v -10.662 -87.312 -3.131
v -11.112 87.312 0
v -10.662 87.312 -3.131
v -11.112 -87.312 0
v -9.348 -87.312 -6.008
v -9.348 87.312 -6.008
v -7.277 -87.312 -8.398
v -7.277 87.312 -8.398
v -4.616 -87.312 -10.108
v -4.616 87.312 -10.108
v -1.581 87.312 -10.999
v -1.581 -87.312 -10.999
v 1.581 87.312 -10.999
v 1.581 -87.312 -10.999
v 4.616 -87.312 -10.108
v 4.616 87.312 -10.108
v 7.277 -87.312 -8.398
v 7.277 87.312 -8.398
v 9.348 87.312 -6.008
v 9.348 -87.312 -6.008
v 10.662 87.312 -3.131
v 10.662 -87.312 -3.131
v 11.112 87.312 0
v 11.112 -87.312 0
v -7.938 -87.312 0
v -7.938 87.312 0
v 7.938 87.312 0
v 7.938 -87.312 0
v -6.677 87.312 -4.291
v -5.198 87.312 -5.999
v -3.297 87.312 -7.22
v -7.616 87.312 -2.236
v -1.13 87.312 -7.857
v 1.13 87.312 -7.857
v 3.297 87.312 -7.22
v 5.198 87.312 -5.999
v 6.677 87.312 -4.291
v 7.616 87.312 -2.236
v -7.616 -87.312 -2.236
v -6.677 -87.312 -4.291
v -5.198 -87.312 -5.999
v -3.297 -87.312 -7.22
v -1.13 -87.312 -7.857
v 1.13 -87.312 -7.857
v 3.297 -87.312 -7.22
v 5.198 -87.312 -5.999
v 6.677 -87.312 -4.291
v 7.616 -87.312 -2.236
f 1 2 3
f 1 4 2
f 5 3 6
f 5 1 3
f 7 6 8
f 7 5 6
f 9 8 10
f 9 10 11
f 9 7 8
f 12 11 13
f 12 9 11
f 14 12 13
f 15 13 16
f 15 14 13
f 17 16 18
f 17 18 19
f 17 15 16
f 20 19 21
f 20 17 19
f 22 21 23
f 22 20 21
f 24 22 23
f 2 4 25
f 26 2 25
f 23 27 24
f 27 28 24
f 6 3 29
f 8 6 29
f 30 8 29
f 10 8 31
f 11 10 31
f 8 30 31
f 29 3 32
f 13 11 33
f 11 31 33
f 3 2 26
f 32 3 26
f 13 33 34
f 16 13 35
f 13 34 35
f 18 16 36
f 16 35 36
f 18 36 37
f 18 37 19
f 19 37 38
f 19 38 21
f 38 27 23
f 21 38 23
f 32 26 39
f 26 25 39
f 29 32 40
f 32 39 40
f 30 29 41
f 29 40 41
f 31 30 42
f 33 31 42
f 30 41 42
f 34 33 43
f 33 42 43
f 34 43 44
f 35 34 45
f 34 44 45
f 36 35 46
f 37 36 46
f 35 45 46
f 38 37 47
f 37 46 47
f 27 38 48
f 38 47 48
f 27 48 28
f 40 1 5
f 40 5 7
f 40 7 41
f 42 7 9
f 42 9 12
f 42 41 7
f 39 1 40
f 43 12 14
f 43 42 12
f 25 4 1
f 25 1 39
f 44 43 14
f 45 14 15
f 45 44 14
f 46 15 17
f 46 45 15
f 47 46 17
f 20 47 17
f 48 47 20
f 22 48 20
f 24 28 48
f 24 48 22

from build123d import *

# Parameters (mm, degrees)
F0_R     = 11.1125
F1_DEPTH = 87.3125
F2_R     = 7.9375
F3_DEPTH = 127
F4_W     = 41.7499989271
F4_H     = 12.747396715
F5_DEPTH = 127


with BuildPart() as f1:
    # F0 (on Front) → F1 (new body, symmetric)
    with BuildSketch(Plane.XZ):
        Circle(F0_R)
    extrude(amount=F1_DEPTH, both=True)

    # F2 (on Front) → F3 (cut, symmetric)
    with BuildSketch(Plane.XZ):
        Circle(F2_R)
    extrude(amount=F3_DEPTH, both=True, mode=Mode.SUBTRACT)

    # F4 (on Front) → F5 (cut, symmetric)
    with BuildSketch(Plane.XZ):
        with Locations((-0.1250002533, 6.3736983575)):
            Rectangle(F4_W, F4_H)
    extrude(amount=F5_DEPTH, both=True, mode=Mode.SUBTRACT)


solid = f1.part
